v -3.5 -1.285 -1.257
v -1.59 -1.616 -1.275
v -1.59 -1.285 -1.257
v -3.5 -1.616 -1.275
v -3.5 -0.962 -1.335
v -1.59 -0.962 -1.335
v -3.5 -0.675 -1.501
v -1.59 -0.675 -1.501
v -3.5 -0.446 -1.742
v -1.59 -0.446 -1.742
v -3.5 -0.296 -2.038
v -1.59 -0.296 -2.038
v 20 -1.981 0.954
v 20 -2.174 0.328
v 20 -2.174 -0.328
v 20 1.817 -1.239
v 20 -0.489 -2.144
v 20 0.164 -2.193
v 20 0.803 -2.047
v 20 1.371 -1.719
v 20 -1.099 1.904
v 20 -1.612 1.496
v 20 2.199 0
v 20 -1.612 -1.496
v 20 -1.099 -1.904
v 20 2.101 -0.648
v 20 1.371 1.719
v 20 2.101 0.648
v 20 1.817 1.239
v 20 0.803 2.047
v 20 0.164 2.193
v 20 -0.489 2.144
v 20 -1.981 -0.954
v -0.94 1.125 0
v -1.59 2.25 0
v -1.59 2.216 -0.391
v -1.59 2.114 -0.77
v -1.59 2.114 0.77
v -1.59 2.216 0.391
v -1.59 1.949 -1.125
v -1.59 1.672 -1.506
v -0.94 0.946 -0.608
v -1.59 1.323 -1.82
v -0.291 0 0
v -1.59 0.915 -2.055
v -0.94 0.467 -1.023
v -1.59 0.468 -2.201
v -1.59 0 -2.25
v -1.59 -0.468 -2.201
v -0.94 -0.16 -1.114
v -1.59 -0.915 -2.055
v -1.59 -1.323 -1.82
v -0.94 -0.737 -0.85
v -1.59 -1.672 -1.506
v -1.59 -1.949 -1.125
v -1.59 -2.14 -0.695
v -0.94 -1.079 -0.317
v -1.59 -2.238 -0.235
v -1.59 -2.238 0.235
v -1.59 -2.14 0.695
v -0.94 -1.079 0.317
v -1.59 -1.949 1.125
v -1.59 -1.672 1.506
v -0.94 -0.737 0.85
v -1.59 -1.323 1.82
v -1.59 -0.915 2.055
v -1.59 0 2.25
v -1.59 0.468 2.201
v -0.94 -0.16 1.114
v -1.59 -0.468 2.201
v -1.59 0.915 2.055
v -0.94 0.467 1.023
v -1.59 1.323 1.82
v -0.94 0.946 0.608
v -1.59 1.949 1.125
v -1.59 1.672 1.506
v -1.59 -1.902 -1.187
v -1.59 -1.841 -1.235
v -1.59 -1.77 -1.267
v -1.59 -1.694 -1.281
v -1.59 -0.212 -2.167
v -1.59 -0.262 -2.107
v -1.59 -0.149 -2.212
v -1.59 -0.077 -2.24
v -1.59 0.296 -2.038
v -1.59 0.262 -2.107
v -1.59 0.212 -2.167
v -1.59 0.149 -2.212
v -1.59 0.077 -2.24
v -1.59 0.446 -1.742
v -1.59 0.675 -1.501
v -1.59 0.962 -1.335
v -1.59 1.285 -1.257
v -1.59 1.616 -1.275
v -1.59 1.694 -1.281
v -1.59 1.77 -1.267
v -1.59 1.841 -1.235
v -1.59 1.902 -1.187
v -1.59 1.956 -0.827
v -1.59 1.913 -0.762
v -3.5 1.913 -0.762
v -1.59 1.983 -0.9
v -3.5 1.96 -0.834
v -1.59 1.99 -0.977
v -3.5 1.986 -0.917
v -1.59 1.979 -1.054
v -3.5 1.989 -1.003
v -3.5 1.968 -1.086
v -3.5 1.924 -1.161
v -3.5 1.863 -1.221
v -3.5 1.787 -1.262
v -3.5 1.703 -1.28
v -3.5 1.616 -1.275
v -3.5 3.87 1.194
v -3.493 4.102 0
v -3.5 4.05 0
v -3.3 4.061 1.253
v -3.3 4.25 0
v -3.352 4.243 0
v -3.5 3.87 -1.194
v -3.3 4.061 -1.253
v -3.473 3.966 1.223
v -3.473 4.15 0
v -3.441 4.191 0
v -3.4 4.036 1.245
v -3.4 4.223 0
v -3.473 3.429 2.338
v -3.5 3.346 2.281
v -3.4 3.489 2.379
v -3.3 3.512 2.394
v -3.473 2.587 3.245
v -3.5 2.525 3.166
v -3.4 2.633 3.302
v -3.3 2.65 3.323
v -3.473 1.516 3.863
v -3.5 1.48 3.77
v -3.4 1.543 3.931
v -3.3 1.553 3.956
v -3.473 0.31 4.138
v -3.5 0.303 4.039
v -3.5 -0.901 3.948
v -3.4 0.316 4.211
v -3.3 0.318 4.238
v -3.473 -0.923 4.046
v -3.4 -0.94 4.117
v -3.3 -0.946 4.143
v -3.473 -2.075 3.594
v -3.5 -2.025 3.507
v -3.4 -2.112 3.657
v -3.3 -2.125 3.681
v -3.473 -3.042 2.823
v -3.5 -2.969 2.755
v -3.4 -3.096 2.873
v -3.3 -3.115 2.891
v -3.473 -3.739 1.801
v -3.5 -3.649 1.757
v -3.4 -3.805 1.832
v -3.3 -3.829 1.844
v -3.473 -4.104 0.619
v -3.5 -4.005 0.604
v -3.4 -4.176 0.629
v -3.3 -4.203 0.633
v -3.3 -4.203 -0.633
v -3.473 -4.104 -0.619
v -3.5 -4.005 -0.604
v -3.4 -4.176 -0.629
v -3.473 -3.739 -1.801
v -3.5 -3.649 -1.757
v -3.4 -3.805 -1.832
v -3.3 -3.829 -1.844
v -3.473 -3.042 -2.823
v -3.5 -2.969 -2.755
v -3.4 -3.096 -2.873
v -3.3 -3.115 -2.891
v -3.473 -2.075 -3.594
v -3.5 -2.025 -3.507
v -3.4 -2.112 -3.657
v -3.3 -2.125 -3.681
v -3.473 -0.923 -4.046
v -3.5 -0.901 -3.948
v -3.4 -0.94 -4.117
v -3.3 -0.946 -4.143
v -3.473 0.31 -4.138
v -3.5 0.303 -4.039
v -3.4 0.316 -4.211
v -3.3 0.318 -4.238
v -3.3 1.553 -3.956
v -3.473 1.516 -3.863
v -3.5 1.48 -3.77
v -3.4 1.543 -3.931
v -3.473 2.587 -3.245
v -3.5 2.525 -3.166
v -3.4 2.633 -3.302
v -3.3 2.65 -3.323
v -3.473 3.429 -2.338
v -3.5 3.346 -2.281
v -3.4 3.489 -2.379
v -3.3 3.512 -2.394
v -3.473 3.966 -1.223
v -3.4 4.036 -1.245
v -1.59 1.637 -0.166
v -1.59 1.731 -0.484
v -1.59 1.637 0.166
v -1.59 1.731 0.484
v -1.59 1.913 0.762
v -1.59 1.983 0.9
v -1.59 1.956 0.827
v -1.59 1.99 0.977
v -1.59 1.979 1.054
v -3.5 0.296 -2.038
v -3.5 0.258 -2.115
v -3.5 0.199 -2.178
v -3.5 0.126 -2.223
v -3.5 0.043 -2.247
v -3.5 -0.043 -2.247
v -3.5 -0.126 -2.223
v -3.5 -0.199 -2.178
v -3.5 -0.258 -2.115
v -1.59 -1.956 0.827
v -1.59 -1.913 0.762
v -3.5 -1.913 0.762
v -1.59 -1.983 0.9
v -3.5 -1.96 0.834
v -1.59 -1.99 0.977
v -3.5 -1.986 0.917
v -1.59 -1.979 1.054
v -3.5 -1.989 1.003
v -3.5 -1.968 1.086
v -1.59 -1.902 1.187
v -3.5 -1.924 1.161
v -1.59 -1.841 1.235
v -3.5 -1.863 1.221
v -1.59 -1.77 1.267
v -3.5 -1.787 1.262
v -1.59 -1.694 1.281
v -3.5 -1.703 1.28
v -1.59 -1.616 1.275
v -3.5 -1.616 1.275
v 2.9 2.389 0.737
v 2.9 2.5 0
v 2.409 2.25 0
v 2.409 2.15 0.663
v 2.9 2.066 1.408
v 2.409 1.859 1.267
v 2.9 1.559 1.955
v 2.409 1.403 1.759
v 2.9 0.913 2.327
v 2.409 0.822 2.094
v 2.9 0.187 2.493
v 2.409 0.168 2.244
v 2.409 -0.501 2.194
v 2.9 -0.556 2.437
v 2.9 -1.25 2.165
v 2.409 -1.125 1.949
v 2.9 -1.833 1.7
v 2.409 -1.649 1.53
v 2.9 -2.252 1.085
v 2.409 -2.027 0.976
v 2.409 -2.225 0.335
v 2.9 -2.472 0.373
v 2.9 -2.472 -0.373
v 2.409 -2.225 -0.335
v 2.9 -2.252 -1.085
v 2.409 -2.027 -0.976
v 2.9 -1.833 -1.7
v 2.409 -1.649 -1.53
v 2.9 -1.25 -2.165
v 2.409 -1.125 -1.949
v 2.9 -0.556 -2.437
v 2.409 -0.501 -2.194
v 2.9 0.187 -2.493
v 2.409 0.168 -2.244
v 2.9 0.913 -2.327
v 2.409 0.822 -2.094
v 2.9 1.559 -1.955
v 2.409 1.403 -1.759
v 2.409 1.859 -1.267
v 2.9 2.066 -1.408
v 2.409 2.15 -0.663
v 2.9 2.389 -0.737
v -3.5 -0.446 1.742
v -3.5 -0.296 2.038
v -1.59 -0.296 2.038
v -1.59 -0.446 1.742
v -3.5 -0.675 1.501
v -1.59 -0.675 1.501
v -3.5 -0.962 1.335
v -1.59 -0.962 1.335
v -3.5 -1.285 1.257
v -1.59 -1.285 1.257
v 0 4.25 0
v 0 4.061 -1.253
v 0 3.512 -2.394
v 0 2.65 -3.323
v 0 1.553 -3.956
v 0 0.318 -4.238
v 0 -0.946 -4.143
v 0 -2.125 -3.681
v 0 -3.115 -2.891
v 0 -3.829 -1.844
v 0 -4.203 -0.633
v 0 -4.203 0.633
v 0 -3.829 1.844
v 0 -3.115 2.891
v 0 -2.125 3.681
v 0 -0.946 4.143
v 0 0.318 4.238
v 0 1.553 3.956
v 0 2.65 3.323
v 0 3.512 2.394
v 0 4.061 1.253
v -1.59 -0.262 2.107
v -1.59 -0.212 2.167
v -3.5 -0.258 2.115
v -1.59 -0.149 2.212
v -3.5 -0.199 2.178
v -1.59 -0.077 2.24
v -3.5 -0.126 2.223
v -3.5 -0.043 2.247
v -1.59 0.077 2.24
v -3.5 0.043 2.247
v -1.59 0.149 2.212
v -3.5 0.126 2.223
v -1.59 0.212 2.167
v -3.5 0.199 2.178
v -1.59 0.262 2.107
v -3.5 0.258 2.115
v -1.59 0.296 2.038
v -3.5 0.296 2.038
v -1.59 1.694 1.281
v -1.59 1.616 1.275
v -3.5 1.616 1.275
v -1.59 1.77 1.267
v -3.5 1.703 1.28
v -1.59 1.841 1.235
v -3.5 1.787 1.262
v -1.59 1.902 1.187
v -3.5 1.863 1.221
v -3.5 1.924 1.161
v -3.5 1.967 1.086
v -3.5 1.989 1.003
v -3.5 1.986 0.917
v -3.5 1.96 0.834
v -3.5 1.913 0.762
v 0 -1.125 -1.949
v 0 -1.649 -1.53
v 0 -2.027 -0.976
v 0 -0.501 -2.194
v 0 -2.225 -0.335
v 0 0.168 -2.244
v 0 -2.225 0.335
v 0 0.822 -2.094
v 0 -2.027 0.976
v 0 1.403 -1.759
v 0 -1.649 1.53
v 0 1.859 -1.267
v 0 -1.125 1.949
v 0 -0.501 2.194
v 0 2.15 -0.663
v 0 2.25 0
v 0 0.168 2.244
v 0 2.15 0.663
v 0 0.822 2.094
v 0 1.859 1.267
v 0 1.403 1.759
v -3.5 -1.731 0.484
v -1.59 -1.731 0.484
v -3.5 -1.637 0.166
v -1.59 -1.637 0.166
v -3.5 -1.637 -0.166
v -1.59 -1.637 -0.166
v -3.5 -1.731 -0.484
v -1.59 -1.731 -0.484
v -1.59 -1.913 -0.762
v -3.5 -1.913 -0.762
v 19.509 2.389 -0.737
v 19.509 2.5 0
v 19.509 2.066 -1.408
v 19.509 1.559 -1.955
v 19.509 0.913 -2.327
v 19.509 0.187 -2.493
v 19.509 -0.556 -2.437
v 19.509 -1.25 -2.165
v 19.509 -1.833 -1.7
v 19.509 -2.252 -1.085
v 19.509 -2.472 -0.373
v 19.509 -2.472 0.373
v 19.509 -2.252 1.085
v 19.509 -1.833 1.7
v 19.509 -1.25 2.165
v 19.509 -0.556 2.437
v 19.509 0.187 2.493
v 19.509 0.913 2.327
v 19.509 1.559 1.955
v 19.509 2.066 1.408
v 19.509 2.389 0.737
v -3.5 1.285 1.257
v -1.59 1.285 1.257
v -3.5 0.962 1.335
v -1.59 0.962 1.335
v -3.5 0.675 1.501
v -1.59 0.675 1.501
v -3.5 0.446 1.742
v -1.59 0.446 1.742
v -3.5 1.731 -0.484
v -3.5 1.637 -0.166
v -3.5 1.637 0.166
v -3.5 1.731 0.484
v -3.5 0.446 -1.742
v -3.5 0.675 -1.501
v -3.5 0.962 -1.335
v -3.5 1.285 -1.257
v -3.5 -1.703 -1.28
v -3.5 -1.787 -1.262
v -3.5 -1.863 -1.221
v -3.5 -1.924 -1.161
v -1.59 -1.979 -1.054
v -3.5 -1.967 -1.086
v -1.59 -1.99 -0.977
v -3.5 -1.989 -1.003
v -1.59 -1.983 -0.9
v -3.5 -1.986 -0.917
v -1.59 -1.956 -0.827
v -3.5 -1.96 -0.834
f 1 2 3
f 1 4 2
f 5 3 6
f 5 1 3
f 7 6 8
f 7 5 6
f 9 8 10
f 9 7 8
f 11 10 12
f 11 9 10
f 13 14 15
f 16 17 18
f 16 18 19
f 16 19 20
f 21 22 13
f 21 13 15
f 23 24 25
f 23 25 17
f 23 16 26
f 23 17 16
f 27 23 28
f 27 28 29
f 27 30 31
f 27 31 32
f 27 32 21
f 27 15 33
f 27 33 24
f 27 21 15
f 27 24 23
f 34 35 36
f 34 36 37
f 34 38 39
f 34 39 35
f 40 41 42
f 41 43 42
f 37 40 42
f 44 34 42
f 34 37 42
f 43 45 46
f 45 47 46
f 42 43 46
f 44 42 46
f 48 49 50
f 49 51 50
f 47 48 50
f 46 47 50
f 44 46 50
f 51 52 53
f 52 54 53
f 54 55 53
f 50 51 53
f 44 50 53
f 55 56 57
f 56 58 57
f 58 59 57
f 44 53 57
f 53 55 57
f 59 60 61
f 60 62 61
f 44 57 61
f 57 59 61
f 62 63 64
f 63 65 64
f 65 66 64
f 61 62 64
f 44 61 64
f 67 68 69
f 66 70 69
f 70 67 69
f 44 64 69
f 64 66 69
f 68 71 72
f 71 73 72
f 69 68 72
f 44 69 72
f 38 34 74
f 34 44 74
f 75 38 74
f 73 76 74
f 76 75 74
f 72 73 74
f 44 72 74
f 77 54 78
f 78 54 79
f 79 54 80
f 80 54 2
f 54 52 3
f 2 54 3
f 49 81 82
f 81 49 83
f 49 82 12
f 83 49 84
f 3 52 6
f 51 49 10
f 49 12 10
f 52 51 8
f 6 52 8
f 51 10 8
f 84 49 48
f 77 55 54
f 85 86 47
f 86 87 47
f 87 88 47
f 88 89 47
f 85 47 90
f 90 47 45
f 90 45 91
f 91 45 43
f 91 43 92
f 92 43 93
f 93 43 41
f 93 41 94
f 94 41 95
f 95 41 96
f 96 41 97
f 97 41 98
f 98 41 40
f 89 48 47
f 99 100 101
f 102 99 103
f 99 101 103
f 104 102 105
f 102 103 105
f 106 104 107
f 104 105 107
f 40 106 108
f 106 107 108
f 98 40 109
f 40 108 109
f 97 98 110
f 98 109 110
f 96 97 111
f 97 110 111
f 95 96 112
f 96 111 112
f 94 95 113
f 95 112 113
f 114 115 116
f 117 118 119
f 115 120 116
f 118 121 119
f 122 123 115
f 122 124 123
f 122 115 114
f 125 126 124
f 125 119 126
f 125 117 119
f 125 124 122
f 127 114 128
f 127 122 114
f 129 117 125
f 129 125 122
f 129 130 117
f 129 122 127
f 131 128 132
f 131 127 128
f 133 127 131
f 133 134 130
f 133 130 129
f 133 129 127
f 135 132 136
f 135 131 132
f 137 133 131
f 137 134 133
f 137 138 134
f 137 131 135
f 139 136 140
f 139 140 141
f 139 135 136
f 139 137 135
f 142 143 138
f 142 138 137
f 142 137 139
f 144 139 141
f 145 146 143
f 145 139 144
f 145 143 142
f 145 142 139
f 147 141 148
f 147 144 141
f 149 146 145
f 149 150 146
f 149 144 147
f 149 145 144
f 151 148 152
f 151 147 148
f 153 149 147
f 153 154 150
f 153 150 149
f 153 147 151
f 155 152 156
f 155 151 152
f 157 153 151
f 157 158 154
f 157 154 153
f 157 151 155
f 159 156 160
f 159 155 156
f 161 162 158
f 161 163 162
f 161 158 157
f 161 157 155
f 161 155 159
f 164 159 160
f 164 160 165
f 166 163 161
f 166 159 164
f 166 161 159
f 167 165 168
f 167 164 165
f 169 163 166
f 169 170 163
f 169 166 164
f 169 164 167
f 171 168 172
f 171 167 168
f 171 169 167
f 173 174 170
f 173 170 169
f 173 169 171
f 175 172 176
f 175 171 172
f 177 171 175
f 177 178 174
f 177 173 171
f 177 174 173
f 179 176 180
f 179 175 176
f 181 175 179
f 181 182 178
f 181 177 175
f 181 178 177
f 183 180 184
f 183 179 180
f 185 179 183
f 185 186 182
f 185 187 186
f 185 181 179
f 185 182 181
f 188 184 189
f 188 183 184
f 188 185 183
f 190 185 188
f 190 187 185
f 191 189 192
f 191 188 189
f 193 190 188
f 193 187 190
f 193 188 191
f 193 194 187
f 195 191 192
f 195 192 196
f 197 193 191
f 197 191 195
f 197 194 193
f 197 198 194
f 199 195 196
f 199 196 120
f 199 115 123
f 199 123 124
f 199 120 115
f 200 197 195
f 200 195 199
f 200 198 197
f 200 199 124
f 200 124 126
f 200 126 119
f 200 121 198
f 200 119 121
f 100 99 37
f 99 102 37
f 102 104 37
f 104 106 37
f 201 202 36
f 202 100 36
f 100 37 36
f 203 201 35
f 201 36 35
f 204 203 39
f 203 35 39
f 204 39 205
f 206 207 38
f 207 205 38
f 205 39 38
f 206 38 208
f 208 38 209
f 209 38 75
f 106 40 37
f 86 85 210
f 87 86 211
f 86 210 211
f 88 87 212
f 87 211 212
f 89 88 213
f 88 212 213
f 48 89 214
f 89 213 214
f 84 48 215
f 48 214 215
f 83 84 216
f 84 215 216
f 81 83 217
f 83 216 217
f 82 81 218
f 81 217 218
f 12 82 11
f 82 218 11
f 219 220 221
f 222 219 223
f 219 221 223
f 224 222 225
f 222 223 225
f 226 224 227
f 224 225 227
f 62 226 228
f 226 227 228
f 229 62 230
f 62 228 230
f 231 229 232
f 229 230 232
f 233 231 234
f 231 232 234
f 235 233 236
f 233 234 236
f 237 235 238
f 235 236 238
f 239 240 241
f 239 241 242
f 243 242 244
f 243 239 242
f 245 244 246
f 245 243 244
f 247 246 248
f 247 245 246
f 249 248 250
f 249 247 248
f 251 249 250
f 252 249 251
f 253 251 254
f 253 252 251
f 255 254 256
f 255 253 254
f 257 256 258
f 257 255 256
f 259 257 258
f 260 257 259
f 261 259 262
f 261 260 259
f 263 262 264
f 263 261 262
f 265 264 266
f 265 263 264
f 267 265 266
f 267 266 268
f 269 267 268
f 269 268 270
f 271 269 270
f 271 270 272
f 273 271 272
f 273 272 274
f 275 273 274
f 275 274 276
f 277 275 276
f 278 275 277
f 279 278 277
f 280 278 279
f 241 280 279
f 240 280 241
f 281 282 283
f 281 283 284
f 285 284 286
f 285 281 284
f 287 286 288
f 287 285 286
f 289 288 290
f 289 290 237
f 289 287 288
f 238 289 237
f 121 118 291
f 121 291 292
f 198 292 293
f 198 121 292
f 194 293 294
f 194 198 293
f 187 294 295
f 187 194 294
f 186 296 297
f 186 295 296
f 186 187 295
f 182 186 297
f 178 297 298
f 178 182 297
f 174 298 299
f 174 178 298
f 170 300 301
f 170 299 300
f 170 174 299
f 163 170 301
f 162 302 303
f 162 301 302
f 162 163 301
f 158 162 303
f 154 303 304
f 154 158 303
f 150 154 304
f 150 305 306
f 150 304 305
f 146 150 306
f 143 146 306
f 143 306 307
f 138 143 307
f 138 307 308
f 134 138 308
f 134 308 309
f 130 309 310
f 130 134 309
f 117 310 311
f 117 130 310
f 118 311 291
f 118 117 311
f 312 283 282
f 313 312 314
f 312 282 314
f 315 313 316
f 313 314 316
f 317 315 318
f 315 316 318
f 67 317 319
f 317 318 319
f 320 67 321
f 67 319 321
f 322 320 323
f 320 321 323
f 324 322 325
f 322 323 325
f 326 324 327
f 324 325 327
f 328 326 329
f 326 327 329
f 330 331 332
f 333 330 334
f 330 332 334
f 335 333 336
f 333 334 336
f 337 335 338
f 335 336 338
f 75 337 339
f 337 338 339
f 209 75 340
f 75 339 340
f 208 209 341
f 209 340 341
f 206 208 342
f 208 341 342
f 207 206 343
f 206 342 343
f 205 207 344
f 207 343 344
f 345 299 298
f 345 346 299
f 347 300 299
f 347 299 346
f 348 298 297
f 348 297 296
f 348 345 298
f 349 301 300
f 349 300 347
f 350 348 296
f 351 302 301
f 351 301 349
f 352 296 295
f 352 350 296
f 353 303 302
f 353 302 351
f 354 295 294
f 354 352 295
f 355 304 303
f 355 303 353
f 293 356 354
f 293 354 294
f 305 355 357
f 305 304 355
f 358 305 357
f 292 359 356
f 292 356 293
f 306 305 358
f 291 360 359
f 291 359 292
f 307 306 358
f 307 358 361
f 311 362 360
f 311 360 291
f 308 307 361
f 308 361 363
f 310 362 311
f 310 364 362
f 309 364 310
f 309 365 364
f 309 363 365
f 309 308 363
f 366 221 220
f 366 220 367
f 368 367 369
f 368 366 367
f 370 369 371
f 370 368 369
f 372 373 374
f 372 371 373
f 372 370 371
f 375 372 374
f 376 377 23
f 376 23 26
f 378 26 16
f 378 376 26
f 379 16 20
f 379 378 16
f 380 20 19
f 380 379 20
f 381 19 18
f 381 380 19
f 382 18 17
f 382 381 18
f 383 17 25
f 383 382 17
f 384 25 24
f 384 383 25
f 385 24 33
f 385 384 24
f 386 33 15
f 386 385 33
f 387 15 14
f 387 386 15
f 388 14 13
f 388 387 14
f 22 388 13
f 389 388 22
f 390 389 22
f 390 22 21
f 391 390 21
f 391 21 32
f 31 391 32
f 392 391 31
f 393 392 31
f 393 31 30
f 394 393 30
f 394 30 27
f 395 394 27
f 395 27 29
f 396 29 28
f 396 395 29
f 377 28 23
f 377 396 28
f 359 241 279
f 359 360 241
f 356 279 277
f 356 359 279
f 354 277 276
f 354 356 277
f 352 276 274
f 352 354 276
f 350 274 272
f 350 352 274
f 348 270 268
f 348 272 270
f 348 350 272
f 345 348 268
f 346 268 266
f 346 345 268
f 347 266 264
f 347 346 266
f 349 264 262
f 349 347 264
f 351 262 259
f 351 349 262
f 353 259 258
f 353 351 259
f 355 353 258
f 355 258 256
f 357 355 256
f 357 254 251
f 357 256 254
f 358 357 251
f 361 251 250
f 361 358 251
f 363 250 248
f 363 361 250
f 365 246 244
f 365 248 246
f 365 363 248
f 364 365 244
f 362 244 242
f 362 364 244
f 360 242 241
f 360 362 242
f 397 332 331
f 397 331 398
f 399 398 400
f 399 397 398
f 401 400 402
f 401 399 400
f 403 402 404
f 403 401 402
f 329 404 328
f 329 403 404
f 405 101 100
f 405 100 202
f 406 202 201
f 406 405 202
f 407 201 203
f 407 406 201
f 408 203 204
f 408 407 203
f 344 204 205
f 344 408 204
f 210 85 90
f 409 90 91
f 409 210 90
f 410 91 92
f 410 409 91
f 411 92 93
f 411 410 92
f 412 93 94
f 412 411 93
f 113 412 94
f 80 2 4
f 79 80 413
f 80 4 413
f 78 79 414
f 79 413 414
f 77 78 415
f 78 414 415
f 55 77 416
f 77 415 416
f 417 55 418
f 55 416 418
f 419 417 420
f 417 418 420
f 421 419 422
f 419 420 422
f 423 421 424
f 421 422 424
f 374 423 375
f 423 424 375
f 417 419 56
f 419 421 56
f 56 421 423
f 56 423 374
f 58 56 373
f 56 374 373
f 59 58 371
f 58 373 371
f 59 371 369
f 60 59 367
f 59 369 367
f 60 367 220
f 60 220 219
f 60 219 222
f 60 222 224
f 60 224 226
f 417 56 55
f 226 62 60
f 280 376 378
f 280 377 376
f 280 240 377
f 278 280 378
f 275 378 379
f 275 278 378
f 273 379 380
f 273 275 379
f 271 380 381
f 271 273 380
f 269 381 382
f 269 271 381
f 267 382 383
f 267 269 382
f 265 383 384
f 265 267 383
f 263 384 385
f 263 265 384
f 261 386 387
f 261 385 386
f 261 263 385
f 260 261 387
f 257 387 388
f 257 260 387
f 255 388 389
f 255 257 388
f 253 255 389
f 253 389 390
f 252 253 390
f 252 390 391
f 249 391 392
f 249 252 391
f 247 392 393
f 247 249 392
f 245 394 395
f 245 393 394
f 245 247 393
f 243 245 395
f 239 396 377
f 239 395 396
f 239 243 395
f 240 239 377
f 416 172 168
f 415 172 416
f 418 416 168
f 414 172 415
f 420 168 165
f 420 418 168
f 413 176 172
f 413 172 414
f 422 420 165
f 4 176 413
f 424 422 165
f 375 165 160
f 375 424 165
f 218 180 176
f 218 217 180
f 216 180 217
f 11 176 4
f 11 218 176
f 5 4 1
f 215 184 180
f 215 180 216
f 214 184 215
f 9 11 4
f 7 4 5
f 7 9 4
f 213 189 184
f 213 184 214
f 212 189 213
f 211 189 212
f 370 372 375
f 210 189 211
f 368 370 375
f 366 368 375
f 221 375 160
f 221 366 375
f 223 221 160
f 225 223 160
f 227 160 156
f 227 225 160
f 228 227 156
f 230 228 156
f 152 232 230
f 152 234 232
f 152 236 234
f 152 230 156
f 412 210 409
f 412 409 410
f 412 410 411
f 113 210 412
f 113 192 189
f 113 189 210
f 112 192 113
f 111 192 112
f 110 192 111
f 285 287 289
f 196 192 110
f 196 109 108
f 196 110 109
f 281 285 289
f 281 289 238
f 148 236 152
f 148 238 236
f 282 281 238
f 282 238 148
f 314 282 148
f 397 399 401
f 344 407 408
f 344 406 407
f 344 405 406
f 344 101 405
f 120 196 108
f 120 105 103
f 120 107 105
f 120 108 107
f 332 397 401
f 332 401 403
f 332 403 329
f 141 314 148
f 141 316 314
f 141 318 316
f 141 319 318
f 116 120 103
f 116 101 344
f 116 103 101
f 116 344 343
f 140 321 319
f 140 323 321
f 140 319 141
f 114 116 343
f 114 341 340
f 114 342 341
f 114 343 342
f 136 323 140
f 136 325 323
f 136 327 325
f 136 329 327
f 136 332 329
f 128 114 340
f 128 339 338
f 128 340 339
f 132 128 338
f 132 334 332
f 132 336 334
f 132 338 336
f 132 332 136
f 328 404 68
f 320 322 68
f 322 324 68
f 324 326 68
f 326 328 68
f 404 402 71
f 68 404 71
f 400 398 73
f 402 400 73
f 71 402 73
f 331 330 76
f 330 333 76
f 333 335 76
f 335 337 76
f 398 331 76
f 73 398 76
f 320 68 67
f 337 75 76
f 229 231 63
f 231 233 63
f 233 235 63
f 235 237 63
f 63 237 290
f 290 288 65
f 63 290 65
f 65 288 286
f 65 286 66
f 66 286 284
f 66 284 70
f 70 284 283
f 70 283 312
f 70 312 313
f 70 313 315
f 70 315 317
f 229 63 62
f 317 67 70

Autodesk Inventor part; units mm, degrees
ref_plane "YZ Plane" through (0, 0, 0) normal (1, 0, 0) x (0, 1, 0)
ref_plane "XZ Plane" through (0, 0, 0) normal (0, 1, 0) x (-1, 0, 0)
sketch "Szkic1" plane through (0, 0, 0) normal (0, 0, 1) x (1, 0, 0)
  line L0 (-0.291, 0) -> (20, 0)
  line L1 (20, 0) -> (20, 2.5)
  line L2 (20, 2.5) -> (2.9, 2.5)
  line L3 (2.9, 2.5) -> (2.4092, 2.25)
  line L4 (2.4092, 2.25) -> (0, 2.25)
  line L5 (0, 2.25) -> (0, 4.25)
  line L6 (0, 4.25) -> (-3.5, 4.25)
  line L7 (-3.5, 4.25) -> (-3.5, 2.25)
  line L8 (-3.5, 2.25) -> (-1.59, 2.25)
  line L9 (-1.59, 2.25) -> (-0.291, 0)
  line L10 (-8.2, 0) -> (24.7, 0) projected
  line L11 (0, -0.85) -> (0, 5.1) projected
  line L12 (2.9, 2.5) -> (0, 2.5) construction
  dimension "d1" = 17.1
  dimension "d2" = 0.4908
  dimension "d3" = 3.5
  dimension "d4" = 1.91
  dimension "d5" = 60
  dimension "d6" = 5
  dimension "d7" = 4.5
  dimension "d8" = 4.5
  dimension "d9" = 8.5
  dimension "d20" = 20
revolve "Bryła" add sketch "Szkic1" angle 360 about axis through (-0.291, 0, 0) along (1, 0, 0)
sketch "Szkic2" plane through (-3.5, 0, 0) normal (-1, 0, 0) x (0, 0, 1)
  line L0 (0, -5.95) -> (0, 5.95) projected
  line L1 (-5.95, 0) -> (5.95, 0) projected
  circle A0 centre (0, 0) radius 2.25 construction
  circle A1 centre (0, 0) radius 1.625 construction
  line L2 (0, 0) -> (1.9486, 1.125) construction
  line L3 (0, 0) -> (1.125, 1.9486) construction
  arc A2 (1.2752, 1.6165) -> (0.7624, 1.9126) centre (0.9688, 1.6779) ccw
  arc A3 (1.2752, 1.6165) -> (2.0375, 0.2961) centre (2.4069, 1.3897) ccw
  arc A4 (2.0375, -0.2961) -> (2.0375, 0.2961) centre (1.9375, 0) ccw
  arc A5 (2.0375, -0.2961) -> (1.2752, -1.6165) centre (2.4069, -1.3897) ccw
  arc A6 (-0.7624, 1.9126) -> (0.7624, 1.9126) centre (0, 2.7793) ccw
  arc A7 (-0.7624, 1.9126) -> (-1.2752, 1.6165) centre (-0.9688, 1.6779) ccw
  arc A8 (-2.0375, 0.2961) -> (-1.2752, 1.6165) centre (-2.4069, 1.3897) ccw
  arc A9 (-2.0375, 0.2961) -> (-2.0375, -0.2961) centre (-1.9375, 0) ccw
  arc A10 (-1.2752, -1.6165) -> (-2.0375, -0.2961) centre (-2.4069, -1.3897) ccw
  arc A11 (0.7624, -1.9126) -> (1.2752, -1.6165) centre (0.9688, -1.6779) ccw
  arc A12 (0.7624, -1.9126) -> (-0.7624, -1.9126) centre (0, -2.7793) ccw
  arc A13 (-1.2752, -1.6165) -> (-0.7624, -1.9126) centre (-0.9688, -1.6779) ccw
  circle A14 centre (0, 0) radius 2.25 projected
  dimension "d34" = 30
  dimension "d35" = 60
  dimension "d36" = 3.25
  dimension "d37" = 4.5
  dimension "d38" = 0.3125
extrude "Szczelina" add sketch "Szkic2" against normal blind 1.91 contours A14 A13 A12 L0 | L0 A12 A11 A14 | A14 A9 A10 A13 | A11 A5 A4 A14 | A14 A7 A8 A9 | A4 A3 A2 A14 | A6 A7 A14 L0 | L0 A14 A2 A6
fillet "Zaokrąglenie1" radius 0.2 1 edges at (-3.5, -4.25, 0)
thread "Gwint" size "M5x0.8" class "6g" standard "ISO Metric profile" length 17.1
chamfer "Faza1" distance 0.3011 distance2 0.4909 1 edges at (20, -2.5, 0) measured on face at (20, -0.7379, -0.3873)
ref_plane "Work Plane1" through (11.45, 0, 0) normal (0, -0.6331, -0.774) x (1, 0, 0)
equation "\"d1\" = GEL"
equation "\"d2\" = GAL"
equation "\"d3\" = KOH"
equation "\"d4\" = INTI"
equation "\"d6\" = GD"
equation "\"d7\" = BDM"
equation "\"d8\" = SW"
equation "\"d9\" = KOD"
equation "\"d20\" = NLG"
equation "\"d36\" = E0"
equation "\"d37\" = SW"
equation "\"d38\" = -0.25 * E0 + 0.25 * SW"
equation "\"d11\" = INTI"
equation "\"d17\" = RR"
equation "\"d13\" = GEL"
equation "\"d15\" = -0.5 * SPD + 0.5 * GD"
equation "\"GD\" = NND"
equation "\"NLG\" = 20"
equation "\"GEL\" = 17.1"
equation "\"KOD\" = 8.5"
equation "\"KOH\" = 3.5"
equation "\"INTI\" = 1.91"
equation "\"GAL\" = 0.61345 * PTC"
equation "\"GUL\" = 0.61345 * PTC"
equation "\"BDM\" = 4.5"
equation "\"SW\" = 4.5"
equation "\"RR\" = 0.2"
equation "\"SPD\" = NND - 1.2269 * GAL"
equation "\"E0\" = 3.25"
equation "\"TOA\" = 30deg"
equation "\"GD1\" = THREADDIA - 1.2269 * PTC"
equation "\"THREADDIA\" = 5"
equation "\"PTC\" = 0.8"
equation "\"NND\" = 5"
equation "\"RRK\" = 0.35"
properties part number "NF E 25-130 - M5 x 20" material "Stal, miękka"
